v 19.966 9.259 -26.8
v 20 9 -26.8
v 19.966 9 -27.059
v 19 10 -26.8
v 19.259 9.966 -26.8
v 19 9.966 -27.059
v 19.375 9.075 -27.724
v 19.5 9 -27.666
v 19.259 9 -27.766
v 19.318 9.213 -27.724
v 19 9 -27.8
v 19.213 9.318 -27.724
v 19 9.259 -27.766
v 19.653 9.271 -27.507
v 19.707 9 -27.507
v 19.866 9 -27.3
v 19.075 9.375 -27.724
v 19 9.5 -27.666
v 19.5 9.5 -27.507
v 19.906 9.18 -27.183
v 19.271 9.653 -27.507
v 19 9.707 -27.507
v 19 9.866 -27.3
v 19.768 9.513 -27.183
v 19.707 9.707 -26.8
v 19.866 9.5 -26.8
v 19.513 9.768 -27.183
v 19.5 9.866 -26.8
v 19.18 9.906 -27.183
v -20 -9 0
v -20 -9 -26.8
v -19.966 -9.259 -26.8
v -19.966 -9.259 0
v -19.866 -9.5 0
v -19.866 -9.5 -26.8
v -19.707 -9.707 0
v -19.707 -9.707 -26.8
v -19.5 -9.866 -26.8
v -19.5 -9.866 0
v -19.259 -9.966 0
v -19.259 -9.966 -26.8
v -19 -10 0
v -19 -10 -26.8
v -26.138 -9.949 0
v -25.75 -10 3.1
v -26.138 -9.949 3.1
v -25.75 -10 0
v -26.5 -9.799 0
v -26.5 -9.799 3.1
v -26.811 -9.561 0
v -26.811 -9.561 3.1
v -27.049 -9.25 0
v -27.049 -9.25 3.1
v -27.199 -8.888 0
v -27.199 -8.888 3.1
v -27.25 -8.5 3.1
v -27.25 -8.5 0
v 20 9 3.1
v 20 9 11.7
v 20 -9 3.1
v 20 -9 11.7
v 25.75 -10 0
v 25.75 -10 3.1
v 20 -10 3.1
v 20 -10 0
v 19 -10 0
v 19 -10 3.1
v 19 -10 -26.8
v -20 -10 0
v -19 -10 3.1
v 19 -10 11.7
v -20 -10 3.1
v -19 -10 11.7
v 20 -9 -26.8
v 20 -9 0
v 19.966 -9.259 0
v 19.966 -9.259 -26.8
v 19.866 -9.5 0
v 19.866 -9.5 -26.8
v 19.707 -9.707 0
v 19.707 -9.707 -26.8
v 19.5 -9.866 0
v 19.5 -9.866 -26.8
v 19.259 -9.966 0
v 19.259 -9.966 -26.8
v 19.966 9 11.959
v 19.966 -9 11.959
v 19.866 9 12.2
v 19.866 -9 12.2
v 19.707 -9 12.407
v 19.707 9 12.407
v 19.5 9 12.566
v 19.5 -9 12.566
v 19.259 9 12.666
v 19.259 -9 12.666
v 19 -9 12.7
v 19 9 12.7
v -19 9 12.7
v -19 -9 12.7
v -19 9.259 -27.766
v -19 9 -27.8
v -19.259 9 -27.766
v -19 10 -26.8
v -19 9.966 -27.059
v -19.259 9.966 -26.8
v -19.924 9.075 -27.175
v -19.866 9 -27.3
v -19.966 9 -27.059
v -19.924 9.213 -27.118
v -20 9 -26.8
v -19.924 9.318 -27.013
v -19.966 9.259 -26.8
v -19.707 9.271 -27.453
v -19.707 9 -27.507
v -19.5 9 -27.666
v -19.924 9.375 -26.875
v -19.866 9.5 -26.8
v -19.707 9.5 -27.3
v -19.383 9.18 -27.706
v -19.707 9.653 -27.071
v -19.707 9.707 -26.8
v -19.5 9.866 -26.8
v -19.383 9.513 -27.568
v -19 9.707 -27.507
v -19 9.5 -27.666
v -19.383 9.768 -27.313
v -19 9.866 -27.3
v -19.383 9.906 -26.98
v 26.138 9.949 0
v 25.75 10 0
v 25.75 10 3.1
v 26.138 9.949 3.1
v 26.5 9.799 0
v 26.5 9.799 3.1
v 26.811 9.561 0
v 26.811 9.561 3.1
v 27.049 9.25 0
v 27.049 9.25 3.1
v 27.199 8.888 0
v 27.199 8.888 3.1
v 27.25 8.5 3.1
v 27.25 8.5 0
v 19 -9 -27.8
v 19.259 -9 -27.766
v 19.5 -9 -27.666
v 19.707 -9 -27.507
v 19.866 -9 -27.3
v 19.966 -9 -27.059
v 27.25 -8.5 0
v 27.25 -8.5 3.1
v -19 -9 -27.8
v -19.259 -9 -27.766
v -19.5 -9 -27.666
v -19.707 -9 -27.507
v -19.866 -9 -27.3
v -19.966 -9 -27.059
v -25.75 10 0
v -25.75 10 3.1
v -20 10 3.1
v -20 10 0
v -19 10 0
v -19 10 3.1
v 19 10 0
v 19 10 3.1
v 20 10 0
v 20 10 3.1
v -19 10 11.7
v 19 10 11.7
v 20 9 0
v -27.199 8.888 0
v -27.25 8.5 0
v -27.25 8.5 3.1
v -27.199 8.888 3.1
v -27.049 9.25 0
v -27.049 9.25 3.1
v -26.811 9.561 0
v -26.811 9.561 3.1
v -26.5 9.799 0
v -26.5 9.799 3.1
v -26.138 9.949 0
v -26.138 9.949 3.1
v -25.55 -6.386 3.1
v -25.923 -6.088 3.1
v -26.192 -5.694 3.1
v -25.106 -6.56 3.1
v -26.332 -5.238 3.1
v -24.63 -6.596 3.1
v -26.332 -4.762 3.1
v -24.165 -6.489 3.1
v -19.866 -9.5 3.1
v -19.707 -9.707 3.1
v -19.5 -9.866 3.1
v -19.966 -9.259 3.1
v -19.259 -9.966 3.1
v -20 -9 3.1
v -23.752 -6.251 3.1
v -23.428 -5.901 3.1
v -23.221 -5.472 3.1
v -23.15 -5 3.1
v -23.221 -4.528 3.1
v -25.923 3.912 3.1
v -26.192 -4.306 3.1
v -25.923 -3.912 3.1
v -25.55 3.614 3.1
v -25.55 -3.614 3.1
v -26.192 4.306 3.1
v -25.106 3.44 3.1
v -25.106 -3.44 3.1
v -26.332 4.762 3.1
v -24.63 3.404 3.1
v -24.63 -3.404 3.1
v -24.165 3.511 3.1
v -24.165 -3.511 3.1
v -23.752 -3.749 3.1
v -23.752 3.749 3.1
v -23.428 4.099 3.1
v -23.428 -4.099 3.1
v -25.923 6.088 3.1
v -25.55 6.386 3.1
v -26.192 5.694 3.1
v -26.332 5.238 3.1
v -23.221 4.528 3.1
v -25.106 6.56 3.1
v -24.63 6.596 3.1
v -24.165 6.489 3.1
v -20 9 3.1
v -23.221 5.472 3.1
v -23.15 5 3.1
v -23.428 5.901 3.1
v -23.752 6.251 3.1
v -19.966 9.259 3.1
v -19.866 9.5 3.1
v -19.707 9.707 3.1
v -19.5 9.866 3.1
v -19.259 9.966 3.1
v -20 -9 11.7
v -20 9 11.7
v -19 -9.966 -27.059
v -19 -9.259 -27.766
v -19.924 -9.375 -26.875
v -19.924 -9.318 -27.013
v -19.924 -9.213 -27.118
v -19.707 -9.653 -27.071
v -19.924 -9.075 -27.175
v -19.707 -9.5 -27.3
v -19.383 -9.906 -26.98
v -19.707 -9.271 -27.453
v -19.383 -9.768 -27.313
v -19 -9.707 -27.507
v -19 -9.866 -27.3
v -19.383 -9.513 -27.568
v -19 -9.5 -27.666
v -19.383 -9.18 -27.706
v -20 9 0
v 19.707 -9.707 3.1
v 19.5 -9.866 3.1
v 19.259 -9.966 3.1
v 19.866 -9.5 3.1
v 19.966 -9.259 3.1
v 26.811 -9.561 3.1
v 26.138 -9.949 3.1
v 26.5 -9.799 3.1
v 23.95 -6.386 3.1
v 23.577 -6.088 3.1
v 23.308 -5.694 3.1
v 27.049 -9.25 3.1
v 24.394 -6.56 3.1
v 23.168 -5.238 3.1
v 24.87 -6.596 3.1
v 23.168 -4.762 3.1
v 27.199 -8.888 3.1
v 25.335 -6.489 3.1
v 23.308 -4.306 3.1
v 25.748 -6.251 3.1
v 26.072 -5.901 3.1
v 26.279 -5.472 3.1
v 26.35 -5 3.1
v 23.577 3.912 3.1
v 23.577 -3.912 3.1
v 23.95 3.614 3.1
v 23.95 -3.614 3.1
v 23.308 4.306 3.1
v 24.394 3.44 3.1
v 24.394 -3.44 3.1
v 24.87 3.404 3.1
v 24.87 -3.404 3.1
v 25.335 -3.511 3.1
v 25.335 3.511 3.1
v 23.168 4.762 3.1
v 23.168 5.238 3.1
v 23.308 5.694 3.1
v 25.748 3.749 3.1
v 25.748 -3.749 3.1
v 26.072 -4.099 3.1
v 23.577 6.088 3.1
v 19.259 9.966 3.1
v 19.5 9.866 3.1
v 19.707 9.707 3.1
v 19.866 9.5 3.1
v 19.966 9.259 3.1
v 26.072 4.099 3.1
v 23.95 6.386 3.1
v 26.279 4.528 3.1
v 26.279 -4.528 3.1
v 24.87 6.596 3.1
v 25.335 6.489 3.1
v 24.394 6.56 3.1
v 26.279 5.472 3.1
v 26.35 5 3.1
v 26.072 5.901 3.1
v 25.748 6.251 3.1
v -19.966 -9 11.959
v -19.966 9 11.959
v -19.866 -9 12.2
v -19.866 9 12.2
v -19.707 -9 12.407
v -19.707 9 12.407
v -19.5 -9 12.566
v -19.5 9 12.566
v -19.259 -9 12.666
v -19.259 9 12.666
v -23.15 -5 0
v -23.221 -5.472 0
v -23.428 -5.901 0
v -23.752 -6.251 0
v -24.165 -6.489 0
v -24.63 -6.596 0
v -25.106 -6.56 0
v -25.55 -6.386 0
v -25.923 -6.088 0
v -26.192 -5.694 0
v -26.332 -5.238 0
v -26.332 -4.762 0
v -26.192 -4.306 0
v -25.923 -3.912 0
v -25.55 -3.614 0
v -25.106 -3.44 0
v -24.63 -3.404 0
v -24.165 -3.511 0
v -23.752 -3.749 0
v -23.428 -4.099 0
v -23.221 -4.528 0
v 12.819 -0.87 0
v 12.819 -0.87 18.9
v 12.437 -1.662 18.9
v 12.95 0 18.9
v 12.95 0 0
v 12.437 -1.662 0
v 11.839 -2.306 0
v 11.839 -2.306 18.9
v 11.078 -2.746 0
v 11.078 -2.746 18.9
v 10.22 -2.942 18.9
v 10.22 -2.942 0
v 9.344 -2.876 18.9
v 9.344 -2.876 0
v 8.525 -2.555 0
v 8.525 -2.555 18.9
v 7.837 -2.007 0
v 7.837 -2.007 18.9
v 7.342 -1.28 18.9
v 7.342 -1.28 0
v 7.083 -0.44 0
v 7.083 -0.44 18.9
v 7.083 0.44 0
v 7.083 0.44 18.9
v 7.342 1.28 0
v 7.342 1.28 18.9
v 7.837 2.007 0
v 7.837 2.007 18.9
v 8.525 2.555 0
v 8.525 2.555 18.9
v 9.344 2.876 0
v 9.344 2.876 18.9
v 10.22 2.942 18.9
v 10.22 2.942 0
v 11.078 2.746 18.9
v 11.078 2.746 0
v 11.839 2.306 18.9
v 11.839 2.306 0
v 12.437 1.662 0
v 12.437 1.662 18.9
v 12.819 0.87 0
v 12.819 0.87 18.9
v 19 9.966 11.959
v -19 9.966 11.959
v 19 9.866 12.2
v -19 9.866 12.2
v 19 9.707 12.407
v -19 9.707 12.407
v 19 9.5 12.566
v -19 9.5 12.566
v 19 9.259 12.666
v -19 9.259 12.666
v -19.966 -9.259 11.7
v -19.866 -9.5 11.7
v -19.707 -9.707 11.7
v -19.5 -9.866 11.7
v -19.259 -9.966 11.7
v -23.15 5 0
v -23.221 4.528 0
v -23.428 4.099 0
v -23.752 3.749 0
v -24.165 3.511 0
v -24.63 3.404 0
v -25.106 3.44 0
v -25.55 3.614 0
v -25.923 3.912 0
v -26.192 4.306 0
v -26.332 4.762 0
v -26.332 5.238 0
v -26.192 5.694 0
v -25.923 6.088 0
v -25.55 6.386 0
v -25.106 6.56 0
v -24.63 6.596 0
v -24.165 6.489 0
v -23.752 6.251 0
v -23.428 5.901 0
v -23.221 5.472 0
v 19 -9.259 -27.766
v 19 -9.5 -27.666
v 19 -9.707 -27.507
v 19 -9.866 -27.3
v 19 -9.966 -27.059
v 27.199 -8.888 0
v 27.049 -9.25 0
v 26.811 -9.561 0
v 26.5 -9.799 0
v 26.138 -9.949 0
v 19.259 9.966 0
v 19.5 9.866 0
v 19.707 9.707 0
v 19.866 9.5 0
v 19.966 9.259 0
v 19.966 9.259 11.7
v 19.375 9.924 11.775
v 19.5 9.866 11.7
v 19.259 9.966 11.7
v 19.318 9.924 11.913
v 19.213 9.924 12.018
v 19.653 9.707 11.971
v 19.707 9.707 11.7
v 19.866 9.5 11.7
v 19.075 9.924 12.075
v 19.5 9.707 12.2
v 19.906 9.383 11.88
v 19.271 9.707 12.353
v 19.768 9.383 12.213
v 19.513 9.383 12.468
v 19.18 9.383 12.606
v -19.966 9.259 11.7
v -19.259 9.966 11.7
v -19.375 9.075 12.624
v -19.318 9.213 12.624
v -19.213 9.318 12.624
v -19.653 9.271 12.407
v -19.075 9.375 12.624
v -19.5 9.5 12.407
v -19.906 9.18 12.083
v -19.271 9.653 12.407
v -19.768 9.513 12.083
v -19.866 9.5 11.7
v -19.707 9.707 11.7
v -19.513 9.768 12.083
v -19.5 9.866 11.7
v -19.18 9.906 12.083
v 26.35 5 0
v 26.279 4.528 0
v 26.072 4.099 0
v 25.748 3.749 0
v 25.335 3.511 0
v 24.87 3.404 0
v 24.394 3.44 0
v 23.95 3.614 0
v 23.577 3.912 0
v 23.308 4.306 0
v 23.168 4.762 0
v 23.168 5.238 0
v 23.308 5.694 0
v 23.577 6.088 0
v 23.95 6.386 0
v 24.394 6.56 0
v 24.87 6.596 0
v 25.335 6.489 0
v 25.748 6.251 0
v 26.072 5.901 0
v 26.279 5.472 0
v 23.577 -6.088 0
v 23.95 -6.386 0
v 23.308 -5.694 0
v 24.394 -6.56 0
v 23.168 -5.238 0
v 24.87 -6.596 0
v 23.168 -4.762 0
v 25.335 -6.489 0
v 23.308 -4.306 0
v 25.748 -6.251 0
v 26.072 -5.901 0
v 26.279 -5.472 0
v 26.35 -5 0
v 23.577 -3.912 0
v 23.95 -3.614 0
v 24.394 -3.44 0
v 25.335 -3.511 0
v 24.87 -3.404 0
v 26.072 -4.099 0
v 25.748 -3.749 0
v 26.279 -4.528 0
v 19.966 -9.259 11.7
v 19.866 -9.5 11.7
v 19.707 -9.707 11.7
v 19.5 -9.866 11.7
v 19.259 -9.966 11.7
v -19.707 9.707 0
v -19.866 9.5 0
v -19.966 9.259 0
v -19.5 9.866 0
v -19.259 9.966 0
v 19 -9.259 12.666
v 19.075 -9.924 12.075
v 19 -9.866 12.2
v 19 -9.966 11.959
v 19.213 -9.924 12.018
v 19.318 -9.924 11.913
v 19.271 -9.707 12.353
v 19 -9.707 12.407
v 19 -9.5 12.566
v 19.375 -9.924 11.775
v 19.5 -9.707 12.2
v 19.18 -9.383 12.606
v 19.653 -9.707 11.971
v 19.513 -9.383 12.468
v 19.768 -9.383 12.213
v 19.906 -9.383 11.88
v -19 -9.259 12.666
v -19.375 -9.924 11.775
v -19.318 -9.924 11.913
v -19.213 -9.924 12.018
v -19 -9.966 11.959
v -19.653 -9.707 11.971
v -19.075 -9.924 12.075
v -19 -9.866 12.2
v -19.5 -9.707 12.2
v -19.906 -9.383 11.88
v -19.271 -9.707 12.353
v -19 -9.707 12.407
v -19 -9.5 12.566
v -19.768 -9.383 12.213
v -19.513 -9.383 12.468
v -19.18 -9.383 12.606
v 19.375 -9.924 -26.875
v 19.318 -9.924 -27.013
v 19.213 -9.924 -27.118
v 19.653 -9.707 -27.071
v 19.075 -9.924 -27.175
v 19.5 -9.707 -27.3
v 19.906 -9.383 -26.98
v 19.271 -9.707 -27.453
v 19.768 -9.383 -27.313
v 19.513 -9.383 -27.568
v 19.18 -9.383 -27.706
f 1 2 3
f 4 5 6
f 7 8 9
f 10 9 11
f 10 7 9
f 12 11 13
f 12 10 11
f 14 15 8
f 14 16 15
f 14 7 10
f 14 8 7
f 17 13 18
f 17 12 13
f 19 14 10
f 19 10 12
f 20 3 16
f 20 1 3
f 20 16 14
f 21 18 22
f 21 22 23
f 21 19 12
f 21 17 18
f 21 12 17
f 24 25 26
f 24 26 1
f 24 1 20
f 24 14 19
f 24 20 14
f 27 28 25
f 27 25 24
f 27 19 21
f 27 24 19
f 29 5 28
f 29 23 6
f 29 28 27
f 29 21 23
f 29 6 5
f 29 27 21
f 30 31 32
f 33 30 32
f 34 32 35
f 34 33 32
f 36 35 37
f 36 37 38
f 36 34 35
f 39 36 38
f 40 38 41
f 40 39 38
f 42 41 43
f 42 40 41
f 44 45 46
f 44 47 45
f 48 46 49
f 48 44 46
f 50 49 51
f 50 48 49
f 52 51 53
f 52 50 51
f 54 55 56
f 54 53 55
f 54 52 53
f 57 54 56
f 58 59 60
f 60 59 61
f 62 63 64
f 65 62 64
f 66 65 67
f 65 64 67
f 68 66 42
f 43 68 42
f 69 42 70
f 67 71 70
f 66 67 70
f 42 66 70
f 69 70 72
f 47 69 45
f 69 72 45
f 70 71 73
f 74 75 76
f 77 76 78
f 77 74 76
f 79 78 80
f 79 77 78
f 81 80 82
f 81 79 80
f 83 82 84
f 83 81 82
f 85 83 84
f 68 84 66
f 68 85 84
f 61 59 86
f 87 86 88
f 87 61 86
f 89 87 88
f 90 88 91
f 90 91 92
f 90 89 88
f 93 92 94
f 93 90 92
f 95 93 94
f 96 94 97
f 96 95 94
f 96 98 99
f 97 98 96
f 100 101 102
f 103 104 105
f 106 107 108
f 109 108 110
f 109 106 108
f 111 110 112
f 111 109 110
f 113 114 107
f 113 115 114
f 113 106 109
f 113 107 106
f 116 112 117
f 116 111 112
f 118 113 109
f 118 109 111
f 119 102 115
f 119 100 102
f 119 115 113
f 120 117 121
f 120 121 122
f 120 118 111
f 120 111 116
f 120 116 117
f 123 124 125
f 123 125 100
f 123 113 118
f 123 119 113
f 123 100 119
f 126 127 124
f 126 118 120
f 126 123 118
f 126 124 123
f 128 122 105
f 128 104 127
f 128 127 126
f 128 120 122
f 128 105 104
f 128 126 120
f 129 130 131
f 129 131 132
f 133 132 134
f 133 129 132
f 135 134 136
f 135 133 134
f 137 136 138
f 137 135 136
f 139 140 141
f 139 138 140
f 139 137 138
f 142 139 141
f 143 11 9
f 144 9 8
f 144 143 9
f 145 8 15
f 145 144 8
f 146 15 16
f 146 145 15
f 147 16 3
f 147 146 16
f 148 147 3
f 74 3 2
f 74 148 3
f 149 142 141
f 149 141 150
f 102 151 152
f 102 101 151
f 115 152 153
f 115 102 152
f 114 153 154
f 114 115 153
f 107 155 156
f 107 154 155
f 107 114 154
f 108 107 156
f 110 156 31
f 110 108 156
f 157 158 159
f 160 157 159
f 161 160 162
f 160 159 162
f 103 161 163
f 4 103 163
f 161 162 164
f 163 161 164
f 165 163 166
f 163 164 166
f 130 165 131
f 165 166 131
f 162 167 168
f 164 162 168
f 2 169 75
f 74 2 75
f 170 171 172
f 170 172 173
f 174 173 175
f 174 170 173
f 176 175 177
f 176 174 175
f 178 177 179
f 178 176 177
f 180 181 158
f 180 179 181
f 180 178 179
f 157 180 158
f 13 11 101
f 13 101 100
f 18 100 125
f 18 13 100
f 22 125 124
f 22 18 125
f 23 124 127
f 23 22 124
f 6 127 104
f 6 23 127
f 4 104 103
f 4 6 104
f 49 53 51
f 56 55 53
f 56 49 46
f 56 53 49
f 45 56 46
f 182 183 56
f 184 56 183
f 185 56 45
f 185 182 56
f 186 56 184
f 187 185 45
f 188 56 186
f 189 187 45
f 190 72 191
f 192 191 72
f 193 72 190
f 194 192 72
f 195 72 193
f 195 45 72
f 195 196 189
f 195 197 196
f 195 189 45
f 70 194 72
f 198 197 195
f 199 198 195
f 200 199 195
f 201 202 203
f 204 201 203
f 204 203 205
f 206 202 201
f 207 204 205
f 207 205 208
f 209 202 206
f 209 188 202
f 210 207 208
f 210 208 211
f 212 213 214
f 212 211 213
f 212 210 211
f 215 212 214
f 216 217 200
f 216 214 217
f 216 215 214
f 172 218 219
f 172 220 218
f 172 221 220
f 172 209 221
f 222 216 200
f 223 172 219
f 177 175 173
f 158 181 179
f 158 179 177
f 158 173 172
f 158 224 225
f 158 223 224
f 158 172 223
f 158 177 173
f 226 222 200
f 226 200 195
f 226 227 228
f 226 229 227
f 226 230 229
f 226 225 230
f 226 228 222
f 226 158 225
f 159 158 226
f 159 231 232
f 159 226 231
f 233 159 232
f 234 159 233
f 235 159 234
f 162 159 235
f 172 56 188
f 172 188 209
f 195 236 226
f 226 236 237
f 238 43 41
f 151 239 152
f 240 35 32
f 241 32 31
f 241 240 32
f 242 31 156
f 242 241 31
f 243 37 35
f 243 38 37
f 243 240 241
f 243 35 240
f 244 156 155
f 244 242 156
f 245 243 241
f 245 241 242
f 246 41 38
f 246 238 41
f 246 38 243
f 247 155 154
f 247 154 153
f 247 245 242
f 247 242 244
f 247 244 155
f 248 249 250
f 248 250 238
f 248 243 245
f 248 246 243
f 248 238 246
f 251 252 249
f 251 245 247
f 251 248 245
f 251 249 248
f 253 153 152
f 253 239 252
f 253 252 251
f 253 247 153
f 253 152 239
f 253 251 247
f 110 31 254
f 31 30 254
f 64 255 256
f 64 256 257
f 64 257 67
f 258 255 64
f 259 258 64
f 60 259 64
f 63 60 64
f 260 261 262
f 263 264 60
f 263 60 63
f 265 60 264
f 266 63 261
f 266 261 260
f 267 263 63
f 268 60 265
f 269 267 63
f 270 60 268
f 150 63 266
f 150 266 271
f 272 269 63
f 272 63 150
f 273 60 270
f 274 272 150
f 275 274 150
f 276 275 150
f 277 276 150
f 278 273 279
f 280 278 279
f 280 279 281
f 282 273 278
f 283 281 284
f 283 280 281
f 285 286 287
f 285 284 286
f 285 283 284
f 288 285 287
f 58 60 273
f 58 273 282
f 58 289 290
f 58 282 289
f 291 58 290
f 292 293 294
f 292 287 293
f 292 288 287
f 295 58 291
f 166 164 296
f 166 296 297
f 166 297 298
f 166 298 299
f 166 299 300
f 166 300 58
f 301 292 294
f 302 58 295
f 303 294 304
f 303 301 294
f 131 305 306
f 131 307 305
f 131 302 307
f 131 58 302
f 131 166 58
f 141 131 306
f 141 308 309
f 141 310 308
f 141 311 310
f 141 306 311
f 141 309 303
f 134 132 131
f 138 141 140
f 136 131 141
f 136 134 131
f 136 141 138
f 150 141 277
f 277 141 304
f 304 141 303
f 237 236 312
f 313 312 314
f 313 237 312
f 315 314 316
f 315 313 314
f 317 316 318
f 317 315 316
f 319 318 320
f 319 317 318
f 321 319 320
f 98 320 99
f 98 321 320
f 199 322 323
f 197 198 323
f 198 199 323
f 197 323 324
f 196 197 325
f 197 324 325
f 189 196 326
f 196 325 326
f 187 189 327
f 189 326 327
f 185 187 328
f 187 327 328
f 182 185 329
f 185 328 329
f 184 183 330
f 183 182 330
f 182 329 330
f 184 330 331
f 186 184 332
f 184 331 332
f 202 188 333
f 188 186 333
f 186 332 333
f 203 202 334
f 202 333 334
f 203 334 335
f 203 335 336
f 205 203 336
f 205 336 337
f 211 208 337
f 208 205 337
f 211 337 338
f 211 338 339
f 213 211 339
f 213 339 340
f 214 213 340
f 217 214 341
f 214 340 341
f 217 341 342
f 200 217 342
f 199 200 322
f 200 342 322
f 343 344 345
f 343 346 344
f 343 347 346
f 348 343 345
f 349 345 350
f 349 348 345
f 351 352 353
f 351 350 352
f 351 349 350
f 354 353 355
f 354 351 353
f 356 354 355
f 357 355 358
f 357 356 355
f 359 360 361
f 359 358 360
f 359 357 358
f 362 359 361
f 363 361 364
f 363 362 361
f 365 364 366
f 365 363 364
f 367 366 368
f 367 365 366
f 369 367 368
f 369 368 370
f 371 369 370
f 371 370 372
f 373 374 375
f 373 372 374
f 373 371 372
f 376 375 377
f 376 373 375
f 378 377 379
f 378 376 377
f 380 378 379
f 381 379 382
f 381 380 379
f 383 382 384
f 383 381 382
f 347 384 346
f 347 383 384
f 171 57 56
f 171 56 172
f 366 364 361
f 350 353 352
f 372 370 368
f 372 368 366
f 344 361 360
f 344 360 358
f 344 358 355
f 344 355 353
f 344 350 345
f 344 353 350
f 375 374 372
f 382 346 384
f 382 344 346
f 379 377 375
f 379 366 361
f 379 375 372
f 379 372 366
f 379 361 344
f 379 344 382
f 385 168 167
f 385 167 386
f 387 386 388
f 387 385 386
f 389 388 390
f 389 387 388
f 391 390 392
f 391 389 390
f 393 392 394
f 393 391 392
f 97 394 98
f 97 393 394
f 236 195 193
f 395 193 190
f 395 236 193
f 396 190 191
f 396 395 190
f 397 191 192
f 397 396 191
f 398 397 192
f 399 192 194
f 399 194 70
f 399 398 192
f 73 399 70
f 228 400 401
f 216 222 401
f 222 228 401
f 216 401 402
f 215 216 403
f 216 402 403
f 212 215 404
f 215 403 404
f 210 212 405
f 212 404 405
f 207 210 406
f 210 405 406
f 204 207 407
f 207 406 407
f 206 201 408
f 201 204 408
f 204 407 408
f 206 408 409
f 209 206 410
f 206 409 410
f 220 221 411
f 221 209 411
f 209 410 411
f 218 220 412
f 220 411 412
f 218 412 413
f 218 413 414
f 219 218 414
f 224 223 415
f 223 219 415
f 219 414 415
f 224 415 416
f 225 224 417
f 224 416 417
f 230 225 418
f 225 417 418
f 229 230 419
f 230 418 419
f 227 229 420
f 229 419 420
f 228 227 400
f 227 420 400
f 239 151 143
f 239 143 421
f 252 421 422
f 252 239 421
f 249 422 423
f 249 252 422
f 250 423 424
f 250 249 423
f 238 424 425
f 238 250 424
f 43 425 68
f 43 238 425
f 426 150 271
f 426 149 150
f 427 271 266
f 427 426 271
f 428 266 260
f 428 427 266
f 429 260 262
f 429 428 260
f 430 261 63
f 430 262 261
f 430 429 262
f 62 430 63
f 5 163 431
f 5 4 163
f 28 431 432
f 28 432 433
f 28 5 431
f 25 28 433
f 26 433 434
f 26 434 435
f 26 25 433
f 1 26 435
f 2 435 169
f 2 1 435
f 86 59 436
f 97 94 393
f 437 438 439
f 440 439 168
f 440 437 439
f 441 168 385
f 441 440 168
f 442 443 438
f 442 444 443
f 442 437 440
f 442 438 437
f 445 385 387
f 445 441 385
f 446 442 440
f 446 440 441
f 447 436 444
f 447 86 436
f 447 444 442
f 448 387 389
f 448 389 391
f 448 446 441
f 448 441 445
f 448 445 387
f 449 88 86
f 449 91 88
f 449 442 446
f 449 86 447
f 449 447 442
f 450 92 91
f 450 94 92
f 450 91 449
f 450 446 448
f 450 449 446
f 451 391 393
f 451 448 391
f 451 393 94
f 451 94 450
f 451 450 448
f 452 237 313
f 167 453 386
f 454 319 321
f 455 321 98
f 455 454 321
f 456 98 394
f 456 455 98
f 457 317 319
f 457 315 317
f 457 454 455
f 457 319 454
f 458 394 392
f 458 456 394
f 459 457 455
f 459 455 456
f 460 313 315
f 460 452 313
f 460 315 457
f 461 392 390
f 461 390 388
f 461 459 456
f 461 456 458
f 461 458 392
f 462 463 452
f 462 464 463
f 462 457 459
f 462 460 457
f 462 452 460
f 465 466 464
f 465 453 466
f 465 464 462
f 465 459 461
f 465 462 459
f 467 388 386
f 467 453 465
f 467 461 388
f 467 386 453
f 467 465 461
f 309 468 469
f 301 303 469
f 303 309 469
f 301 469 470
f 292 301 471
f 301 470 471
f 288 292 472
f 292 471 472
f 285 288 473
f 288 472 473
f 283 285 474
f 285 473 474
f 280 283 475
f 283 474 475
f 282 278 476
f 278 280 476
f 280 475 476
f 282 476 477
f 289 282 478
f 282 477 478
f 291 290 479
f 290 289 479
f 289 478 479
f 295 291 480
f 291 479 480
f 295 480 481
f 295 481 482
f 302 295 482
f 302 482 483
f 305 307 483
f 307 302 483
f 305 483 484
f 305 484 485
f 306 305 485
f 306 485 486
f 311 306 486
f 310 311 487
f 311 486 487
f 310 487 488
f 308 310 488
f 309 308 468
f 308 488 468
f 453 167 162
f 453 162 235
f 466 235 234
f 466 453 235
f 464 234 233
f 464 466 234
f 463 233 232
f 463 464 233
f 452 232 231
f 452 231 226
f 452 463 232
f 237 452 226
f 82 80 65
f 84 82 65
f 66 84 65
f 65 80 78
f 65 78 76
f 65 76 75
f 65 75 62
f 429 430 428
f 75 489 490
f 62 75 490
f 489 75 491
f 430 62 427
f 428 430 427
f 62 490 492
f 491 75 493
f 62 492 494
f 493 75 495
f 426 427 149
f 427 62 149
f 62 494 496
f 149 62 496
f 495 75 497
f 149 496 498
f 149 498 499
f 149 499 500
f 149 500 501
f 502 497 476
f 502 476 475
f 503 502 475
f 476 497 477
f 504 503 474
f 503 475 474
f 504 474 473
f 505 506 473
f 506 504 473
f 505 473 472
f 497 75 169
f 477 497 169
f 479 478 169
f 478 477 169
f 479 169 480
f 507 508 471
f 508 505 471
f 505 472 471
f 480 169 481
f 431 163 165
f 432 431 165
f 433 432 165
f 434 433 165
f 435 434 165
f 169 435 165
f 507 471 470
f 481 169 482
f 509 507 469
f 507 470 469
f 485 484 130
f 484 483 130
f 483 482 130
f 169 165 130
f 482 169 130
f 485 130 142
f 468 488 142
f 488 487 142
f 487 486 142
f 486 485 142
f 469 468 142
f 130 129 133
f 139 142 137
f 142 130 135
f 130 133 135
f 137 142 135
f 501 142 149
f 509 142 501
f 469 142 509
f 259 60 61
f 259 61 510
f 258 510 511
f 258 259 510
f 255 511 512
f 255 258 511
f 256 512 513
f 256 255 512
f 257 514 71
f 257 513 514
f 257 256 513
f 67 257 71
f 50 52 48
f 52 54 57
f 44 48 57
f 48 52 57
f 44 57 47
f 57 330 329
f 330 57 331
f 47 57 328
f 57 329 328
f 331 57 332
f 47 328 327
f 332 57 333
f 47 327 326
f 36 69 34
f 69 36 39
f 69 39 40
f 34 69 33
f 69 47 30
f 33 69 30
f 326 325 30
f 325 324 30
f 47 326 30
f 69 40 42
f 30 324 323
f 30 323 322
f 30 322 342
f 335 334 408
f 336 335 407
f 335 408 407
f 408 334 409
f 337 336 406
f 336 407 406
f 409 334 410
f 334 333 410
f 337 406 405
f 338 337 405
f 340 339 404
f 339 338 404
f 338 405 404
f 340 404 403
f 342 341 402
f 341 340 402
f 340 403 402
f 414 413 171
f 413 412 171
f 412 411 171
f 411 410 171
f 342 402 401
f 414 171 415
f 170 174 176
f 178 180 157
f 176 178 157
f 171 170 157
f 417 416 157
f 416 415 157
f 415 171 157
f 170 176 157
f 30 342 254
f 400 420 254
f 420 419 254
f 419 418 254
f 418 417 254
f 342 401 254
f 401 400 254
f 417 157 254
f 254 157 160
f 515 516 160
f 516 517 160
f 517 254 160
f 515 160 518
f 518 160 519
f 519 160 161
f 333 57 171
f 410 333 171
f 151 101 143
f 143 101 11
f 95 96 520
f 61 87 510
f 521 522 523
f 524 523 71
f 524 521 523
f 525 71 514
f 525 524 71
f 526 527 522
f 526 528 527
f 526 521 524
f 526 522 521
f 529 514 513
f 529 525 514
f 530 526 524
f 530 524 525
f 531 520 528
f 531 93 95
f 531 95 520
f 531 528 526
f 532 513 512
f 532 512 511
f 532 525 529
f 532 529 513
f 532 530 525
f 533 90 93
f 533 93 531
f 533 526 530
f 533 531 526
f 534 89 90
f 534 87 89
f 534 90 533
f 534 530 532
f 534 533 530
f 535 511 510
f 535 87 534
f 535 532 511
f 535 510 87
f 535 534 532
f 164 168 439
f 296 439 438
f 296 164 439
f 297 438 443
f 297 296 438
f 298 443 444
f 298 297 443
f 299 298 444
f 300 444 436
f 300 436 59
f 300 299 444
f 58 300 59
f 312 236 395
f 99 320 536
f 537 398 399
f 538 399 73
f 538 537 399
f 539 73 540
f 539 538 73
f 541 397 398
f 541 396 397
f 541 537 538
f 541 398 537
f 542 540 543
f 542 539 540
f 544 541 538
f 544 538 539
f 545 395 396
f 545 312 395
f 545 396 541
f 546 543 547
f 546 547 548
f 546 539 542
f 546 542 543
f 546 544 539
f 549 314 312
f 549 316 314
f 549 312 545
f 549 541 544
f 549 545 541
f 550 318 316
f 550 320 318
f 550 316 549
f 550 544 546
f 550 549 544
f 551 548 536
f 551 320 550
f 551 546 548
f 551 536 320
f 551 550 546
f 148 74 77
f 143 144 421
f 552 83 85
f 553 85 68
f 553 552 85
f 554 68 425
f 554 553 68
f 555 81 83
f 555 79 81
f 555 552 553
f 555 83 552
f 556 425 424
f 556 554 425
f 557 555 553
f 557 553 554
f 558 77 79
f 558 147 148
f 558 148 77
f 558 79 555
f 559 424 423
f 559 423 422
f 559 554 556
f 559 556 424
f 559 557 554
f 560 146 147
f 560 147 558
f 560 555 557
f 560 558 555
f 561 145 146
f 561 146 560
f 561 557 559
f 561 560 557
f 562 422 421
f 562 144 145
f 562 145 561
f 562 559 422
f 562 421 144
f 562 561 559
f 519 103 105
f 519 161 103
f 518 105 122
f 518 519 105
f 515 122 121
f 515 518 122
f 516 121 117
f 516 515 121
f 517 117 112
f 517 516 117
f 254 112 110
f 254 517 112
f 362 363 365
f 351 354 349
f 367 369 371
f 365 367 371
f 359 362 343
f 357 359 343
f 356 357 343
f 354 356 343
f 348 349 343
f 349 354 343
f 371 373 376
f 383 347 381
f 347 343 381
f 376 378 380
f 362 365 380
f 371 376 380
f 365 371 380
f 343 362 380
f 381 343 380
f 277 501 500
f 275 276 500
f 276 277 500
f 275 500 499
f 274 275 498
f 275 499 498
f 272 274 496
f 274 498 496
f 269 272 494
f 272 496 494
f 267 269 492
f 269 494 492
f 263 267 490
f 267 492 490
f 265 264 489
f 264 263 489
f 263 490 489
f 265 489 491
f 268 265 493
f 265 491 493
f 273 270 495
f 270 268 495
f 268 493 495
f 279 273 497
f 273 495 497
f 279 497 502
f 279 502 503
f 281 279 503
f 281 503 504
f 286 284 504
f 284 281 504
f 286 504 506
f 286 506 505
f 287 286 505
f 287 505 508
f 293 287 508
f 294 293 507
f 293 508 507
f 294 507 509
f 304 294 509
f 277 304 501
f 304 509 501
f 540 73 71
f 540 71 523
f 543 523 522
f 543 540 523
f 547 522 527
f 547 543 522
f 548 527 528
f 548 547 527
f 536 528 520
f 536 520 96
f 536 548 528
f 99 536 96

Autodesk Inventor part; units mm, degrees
ref_plane "YZ Plane" through (0, 0, 0) normal (1, 0, 0) x (0, 1, 0)
ref_plane "XZ Plane" through (0, 0, 0) normal (0, 1, 0) x (-1, 0, 0)
ref_plane "XY Plane" through (0, 0, 0) normal (0, 0, 1) x (1, 0, 0)
sketch "Эскиз1" plane through (0, 0, 0) normal (0, 0, 1) x (1, 0, 0)
  line L0 (-25.75, 10) -> (25.75, 10)
  line L1 (27.25, 8.5) -> (27.25, -8.5)
  line L2 (25.75, -10) -> (-25.75, -10)
  line L3 (-27.25, -8.5) -> (-27.25, 8.5)
  line L4 (-27.25, 10) -> (27.25, -10) construction
  line L5 (27.25, 10) -> (-27.25, -10) construction
  line L6 (-20, 10) -> (20, 10)
  line L7 (20, 10) -> (20, -10)
  line L8 (20, -10) -> (-20, -10)
  line L9 (-20, -10) -> (-20, 10)
  line L10 (-20, 10) -> (20, -10) construction
  line L11 (20, 10) -> (-20, -10) construction
  arc A0 (27.25, 8.5) -> (25.75, 10) centre (25.75, 8.5) ccw
  arc A1 (25.75, -10) -> (27.25, -8.5) centre (25.75, -8.5) ccw
  arc A2 (-27.25, -8.5) -> (-25.75, -10) centre (-25.75, -8.5) ccw
  arc A3 (-25.75, 10) -> (-27.25, 8.5) centre (-25.75, 8.5) ccw
  line L12 (-34.7079, 0) -> (34.7079, 0) construction
  circle A4 centre (10, 0) radius 2.95
  line L13 (24.75, -5) -> (-24.75, -5) construction
  line L14 (-24.75, -5) -> (-24.75, 5) construction
  line L15 (-24.75, 5) -> (24.75, 5) construction
  line L16 (24.75, 5) -> (24.75, -5) construction
  line L17 (24.75, -5) -> (-24.75, 5) construction
  line L18 (-24.75, -5) -> (24.75, 5) construction
  circle A5 centre (-24.75, 5) radius 1.6
  circle A6 centre (-24.75, -5) radius 1.6
  circle A7 centre (24.75, 5) radius 1.6
  circle A8 centre (24.75, -5) radius 1.6
  point P0 (0, 0)
  point P1 (0, 0)
  dimension "d0" = 54.5
  dimension "d1" = 20
  dimension "d2" = 40
  dimension "d3" = 20
  dimension "d4" = 1.5
  dimension "d5" = 5.9
  dimension "d6" = 10
  dimension "d7" = 49.5
  dimension "d8" = 10
  dimension "d9" = 3.2
  dimension "d10" = 3.2
  dimension "d11" = 3.2
  dimension "d12" = 3.2
  dimension "d22" = 17.25
extrude "Выдавливание1" add sketch "Эскиз1" along normal blind 12.7 and the other way blind 27.8 contours L0 L7 L2 L9 | A4
extrude "Выдавливание2" add sketch "Эскиз1" along normal blind 18.9 separate body contours A4
extrude "Выдавливание3" add sketch "Эскиз1" along normal blind 3.1 contours L0 L9 L2 A2 L3 A3 | L0 A0 L1 A1 L2 L7 bodies 1
fillet "Сопряжение1" radius 1 16 edges at (20, 10, -13.9) (0, 10, -27.8) (20, 0, -27.8) (20, -10, -13.9) (20, 0, 12.7) (20, 10, 7.9) (0, -10, -27.8) (-20, 10, -13.9) (-20, 0, -27.8) (-20, 10, 7.9) (-20, 0, 12.7) (-20, -10, 7.9) (0, -10, 12.7) (0, 10, 12.7) (20, -10, 7.9) (-20, -10, -13.9)
equation "\"servaBodyHeght\" = 40.5"
properties part number "servo20kg-ds8120"
